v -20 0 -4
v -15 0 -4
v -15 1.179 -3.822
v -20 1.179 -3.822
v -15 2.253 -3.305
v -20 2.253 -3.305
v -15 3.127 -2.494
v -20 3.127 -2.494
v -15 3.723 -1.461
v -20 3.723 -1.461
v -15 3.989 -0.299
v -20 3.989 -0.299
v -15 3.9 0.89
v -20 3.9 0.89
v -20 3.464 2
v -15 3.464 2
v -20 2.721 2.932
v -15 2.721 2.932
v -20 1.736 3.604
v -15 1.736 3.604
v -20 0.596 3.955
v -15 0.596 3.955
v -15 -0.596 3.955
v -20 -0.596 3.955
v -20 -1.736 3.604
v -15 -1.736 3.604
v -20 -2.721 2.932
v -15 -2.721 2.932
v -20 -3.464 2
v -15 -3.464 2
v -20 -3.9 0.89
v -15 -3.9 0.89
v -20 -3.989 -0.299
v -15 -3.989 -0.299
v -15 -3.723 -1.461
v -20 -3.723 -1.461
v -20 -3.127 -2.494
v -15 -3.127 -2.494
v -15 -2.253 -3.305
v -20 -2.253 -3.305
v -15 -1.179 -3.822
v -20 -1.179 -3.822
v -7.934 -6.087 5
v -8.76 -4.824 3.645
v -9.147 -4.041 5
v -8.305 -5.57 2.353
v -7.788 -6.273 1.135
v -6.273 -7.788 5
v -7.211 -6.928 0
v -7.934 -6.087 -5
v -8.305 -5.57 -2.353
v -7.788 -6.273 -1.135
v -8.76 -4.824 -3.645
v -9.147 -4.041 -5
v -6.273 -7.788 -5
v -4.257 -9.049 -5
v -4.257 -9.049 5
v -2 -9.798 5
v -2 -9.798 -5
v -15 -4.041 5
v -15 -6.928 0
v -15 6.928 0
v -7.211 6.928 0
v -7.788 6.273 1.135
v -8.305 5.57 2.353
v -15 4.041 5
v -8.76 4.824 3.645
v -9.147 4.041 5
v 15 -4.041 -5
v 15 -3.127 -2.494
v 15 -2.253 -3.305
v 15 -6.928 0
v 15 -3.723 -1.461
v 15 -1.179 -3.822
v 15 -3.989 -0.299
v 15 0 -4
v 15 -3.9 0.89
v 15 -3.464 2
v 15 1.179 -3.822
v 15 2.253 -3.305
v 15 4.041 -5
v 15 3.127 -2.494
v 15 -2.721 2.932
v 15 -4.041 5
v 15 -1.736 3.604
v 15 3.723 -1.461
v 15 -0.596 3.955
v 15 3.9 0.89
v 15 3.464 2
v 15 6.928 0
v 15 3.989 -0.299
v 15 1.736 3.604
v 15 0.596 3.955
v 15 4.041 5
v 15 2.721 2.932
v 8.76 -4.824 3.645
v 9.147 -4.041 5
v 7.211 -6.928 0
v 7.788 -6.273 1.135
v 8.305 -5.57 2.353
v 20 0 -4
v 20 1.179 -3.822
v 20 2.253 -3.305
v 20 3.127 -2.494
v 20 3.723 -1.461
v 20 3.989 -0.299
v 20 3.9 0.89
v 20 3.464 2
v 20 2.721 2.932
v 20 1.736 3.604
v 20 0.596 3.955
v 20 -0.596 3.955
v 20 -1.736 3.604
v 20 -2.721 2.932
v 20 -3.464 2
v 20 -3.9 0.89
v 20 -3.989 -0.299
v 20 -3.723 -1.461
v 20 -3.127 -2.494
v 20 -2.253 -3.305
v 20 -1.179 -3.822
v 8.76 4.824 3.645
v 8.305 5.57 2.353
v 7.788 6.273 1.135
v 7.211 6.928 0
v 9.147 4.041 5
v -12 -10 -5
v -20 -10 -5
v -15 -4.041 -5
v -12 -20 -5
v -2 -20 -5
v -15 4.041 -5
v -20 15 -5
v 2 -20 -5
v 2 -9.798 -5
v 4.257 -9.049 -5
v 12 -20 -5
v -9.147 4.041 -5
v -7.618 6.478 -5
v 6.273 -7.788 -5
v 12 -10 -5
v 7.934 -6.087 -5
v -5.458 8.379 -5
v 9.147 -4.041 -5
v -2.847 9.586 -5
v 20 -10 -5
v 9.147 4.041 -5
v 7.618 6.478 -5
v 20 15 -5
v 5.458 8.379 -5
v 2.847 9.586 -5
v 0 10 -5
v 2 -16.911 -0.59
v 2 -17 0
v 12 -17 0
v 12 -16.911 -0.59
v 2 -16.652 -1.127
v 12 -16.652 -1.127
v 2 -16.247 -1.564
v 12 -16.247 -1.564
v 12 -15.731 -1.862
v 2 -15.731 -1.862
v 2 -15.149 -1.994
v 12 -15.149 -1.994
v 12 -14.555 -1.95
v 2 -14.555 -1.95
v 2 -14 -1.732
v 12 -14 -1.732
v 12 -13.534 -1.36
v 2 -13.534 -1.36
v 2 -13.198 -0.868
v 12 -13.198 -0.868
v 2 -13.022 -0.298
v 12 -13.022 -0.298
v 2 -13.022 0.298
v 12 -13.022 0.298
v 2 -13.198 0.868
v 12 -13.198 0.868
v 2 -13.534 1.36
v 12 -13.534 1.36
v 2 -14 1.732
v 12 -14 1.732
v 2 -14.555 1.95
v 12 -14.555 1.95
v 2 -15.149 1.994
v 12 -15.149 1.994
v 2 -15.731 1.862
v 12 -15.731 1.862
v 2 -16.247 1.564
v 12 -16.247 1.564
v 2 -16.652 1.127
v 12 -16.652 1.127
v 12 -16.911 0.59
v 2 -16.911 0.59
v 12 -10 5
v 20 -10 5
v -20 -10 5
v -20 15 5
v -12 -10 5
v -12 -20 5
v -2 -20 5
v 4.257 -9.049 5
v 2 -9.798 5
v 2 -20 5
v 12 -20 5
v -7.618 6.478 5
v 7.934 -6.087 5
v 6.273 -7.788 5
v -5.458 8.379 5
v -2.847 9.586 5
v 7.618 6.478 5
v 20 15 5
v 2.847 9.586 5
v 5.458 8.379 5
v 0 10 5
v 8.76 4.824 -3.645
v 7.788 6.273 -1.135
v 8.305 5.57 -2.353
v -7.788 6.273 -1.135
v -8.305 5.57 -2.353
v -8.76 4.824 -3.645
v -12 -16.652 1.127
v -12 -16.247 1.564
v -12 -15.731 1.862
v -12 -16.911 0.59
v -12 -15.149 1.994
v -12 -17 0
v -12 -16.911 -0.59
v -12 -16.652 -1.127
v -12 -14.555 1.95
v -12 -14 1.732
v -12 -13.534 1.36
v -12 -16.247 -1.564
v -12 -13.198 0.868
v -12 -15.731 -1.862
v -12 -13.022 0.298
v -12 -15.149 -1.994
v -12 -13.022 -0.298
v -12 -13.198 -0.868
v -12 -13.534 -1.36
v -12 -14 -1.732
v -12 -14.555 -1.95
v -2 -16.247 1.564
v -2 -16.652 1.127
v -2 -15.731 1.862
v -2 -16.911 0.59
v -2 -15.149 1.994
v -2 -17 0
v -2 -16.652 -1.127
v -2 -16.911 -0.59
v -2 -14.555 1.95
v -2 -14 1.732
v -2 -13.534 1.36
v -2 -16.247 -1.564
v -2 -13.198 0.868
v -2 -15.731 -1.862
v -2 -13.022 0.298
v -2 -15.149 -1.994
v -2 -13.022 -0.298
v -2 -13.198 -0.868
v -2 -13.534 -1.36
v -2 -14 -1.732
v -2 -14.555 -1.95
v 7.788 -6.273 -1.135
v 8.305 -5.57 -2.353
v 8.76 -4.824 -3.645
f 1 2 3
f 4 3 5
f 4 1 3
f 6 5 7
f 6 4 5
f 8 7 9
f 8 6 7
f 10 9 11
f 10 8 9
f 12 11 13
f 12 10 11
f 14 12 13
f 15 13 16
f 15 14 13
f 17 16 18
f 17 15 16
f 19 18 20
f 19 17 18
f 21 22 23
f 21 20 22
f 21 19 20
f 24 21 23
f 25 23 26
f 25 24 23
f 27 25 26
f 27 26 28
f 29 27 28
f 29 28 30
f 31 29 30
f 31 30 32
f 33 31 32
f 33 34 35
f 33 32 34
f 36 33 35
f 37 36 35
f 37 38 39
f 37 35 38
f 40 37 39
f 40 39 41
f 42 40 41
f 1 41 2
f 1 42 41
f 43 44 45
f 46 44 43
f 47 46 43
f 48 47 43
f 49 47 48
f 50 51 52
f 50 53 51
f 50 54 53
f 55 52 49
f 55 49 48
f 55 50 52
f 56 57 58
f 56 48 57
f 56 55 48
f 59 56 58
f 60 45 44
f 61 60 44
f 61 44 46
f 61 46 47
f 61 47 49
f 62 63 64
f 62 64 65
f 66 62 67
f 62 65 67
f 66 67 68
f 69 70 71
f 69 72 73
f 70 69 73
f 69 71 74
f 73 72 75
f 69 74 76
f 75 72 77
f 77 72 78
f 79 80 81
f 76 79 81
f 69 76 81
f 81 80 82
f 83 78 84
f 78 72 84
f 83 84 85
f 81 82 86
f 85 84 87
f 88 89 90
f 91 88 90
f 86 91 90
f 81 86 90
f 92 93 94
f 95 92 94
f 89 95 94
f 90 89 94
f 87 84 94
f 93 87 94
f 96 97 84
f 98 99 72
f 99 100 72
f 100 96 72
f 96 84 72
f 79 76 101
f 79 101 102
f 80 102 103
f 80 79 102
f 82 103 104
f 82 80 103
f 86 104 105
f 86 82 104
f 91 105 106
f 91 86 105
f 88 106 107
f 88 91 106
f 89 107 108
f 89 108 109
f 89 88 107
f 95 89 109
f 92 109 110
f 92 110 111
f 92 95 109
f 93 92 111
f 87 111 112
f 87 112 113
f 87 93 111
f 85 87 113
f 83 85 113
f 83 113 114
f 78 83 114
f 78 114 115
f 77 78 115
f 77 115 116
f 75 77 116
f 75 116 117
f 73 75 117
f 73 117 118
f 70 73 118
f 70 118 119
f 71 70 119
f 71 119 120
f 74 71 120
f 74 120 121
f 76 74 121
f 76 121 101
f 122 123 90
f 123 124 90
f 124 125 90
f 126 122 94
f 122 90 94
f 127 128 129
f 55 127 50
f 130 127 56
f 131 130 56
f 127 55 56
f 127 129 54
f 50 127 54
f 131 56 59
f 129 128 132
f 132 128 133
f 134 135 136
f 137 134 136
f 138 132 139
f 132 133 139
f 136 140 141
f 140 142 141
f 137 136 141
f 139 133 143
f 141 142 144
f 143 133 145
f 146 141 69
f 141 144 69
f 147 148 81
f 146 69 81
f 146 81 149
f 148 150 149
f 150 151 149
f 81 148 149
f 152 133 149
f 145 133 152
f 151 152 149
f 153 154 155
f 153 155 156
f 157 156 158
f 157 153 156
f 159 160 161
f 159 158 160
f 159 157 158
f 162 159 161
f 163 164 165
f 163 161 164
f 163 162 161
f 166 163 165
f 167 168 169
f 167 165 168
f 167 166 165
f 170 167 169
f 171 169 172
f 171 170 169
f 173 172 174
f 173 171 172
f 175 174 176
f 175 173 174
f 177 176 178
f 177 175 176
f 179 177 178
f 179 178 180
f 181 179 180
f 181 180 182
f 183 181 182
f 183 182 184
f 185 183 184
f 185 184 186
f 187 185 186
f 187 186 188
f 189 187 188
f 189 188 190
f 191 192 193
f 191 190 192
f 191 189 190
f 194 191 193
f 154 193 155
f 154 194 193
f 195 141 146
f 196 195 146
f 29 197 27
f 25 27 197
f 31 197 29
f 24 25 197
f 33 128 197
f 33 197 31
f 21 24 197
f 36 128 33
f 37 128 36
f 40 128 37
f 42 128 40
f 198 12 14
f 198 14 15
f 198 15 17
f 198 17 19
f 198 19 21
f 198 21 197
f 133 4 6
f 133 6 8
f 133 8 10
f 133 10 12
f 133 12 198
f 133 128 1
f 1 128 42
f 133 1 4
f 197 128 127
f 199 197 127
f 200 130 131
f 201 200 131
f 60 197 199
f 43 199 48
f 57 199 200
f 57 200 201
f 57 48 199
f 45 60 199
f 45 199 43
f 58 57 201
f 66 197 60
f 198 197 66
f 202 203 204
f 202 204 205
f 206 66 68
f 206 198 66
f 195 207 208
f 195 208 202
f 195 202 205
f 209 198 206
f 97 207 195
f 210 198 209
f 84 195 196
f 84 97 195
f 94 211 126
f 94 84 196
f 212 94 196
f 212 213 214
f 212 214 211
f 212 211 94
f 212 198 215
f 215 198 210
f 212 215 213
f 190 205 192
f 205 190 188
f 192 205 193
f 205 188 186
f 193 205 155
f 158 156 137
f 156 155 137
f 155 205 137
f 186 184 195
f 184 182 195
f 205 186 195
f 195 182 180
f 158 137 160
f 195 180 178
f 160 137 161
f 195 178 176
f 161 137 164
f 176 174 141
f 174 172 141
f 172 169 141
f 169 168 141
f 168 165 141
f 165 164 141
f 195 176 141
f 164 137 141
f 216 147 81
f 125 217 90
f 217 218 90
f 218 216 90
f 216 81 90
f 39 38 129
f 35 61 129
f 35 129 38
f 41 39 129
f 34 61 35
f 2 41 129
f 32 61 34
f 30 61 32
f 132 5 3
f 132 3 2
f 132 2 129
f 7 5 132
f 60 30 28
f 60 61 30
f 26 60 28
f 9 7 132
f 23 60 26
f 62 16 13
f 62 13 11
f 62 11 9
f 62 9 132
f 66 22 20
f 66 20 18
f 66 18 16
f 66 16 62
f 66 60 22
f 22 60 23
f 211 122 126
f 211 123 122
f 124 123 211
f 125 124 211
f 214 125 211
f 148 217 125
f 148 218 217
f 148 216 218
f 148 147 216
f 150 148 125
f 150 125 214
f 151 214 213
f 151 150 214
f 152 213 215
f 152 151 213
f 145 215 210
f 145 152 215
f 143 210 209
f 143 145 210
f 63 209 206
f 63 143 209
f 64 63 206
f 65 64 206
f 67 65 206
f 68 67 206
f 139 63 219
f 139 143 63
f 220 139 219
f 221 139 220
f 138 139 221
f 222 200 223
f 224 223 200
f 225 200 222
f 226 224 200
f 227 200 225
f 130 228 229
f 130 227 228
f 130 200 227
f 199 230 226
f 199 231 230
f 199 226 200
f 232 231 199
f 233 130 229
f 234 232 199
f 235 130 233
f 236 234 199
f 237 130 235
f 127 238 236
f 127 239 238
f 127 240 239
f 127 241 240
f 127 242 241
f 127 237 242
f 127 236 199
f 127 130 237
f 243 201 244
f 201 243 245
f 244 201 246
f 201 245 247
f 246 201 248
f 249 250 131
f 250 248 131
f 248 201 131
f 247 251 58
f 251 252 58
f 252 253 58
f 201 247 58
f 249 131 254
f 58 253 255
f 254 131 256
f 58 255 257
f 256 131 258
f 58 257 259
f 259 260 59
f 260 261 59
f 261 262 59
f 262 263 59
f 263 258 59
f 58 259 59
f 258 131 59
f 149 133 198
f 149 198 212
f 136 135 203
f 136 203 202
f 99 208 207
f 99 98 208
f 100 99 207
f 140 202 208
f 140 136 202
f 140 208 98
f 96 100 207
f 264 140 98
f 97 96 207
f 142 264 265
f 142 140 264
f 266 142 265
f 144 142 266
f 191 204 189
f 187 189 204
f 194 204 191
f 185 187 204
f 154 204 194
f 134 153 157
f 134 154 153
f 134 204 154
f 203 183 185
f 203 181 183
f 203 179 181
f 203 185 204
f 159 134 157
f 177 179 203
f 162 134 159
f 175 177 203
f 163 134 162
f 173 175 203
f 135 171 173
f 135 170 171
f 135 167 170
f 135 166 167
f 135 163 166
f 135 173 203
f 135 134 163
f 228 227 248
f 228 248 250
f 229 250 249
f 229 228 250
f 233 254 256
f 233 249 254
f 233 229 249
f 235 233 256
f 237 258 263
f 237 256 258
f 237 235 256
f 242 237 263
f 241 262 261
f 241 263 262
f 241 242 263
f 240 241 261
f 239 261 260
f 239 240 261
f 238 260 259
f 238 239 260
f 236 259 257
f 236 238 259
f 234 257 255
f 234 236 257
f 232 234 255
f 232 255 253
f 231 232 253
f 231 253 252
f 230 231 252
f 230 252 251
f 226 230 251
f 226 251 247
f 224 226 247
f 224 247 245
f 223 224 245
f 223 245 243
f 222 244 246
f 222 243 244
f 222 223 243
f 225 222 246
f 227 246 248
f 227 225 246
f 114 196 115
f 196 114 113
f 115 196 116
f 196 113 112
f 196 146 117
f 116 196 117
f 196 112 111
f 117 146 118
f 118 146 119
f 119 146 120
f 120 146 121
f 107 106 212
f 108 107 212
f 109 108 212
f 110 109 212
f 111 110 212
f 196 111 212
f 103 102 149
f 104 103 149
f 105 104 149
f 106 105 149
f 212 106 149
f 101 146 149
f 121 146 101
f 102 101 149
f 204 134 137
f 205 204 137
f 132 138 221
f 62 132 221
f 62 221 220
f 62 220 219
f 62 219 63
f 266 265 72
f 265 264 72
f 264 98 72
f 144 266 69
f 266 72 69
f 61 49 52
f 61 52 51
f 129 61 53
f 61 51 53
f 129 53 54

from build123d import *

# Parameters (mm, degrees)
CYLINDER_R              = 10
CYLINDER_DEPTH          = 10
CYLINDER001_R           = 2
CYLINDER001_DEPTH       = 30
PAD001_DEPTH            = 30
CYLINDER002_R           = 4
CYLINDER002_DEPTH       = 40
CYLINDER002_PITCH_ANGLE = 90
BOX003_W                = 8
BOX003_H                = 10
BOX003_DEPTH            = 10
BOX002_W                = 8
BOX002_H                = 10
BOX002_DEPTH            = 10
BOX001_W                = 4
BOX001_H                = 12
BOX001_DEPTH            = 10
BOX_W                   = 40
BOX_H                   = 35
BOX_DEPTH               = 10


with BuildPart() as cylinder:
    # Cylinder → Cylinder (new body)
    with BuildSketch(Plane.XY.offset(-5)):
        Circle(CYLINDER_R)
    extrude(amount=CYLINDER_DEPTH)


with BuildPart() as cylinder001:
    # Cylinder001 → Cylinder001 (new body)
    with BuildSketch(Plane(origin=(-15, -15, 0), x_dir=(0, -1, 0), z_dir=(1, 0, 0))):
        Circle(CYLINDER001_R)
    extrude(amount=CYLINDER001_DEPTH)


with BuildPart() as other_nut:
    # Sketch001 → Pad001 (new body)
    with BuildSketch(Plane.YZ):
        Polygon((3.464102, 6), (-3.464102, 6), (-6.928203, 0), (-3.464102, -6), (3.464102, -6), (6.928203, 0), align=None)
    extrude(amount=-PAD001_DEPTH)


with BuildPart() as other_nut_1:
    # Body001 placement: moved
    add(other_nut.part.moved(Location((15, 0, 0))))


with BuildPart() as other_screw:
    # Cylinder002 → Cylinder002 (new body)
    with BuildSketch(Plane.XY):
        Circle(CYLINDER002_R)
    extrude(amount=CYLINDER002_DEPTH)


with BuildPart() as other_screw_1:
    # Cylinder002 pitch: moved
    add(other_screw.part.rotate(Axis((0, 0, 0), (0, 1, 0)), CYLINDER002_PITCH_ANGLE))


with BuildPart() as other_screw_2:
    # Cylinder002 placement: moved
    add(other_screw_1.part.moved(Location((-20, 0, 0))))


with BuildPart() as cube003:
    # Box003 → Box003 (new body)
    with BuildSketch(Plane(origin=(-20, -20, -5), x_dir=(1, 0, 0), z_dir=(0, 0, 1))):
        with Locations((4, 5)):
            Rectangle(BOX003_W, BOX003_H)
    extrude(amount=BOX003_DEPTH)


with BuildPart() as cube002:
    # Box002 → Box002 (new body)
    with BuildSketch(Plane(origin=(12, -20, -5), x_dir=(1, 0, 0), z_dir=(0, 0, 1))):
        with Locations((4, 5)):
            Rectangle(BOX002_W, BOX002_H)
    extrude(amount=BOX002_DEPTH)


with BuildPart() as negative_fusion:
    # Box001 → Box001 (new body)
    with BuildSketch(Plane(origin=(-2, -20, -5), x_dir=(1, 0, 0), z_dir=(0, 0, 1))):
        with Locations((2, 6)):
            Rectangle(BOX001_W, BOX001_H)
    extrude(amount=BOX001_DEPTH)

    # Fusion: union Cylinder, Cylinder001, Other Nut, Other Screw, Cube003, Cube002
    add(cylinder.part)
    add(cylinder001.part)
    add(other_nut_1.part)
    add(other_screw_2.part)
    add(cube003.part)
    add(cube002.part)


with BuildPart() as cut:
    # Box → Box (new body)
    with BuildSketch(Plane(origin=(-20, -20, -5), x_dir=(1, 0, 0), z_dir=(0, 0, 1))):
        with Locations((20, 17.5)):
            Rectangle(BOX_W, BOX_H)
    extrude(amount=BOX_DEPTH)

    # Cut: cut Negative Fusion
    add(negative_fusion.part, mode=Mode.SUBTRACT)


solid = cut.part
